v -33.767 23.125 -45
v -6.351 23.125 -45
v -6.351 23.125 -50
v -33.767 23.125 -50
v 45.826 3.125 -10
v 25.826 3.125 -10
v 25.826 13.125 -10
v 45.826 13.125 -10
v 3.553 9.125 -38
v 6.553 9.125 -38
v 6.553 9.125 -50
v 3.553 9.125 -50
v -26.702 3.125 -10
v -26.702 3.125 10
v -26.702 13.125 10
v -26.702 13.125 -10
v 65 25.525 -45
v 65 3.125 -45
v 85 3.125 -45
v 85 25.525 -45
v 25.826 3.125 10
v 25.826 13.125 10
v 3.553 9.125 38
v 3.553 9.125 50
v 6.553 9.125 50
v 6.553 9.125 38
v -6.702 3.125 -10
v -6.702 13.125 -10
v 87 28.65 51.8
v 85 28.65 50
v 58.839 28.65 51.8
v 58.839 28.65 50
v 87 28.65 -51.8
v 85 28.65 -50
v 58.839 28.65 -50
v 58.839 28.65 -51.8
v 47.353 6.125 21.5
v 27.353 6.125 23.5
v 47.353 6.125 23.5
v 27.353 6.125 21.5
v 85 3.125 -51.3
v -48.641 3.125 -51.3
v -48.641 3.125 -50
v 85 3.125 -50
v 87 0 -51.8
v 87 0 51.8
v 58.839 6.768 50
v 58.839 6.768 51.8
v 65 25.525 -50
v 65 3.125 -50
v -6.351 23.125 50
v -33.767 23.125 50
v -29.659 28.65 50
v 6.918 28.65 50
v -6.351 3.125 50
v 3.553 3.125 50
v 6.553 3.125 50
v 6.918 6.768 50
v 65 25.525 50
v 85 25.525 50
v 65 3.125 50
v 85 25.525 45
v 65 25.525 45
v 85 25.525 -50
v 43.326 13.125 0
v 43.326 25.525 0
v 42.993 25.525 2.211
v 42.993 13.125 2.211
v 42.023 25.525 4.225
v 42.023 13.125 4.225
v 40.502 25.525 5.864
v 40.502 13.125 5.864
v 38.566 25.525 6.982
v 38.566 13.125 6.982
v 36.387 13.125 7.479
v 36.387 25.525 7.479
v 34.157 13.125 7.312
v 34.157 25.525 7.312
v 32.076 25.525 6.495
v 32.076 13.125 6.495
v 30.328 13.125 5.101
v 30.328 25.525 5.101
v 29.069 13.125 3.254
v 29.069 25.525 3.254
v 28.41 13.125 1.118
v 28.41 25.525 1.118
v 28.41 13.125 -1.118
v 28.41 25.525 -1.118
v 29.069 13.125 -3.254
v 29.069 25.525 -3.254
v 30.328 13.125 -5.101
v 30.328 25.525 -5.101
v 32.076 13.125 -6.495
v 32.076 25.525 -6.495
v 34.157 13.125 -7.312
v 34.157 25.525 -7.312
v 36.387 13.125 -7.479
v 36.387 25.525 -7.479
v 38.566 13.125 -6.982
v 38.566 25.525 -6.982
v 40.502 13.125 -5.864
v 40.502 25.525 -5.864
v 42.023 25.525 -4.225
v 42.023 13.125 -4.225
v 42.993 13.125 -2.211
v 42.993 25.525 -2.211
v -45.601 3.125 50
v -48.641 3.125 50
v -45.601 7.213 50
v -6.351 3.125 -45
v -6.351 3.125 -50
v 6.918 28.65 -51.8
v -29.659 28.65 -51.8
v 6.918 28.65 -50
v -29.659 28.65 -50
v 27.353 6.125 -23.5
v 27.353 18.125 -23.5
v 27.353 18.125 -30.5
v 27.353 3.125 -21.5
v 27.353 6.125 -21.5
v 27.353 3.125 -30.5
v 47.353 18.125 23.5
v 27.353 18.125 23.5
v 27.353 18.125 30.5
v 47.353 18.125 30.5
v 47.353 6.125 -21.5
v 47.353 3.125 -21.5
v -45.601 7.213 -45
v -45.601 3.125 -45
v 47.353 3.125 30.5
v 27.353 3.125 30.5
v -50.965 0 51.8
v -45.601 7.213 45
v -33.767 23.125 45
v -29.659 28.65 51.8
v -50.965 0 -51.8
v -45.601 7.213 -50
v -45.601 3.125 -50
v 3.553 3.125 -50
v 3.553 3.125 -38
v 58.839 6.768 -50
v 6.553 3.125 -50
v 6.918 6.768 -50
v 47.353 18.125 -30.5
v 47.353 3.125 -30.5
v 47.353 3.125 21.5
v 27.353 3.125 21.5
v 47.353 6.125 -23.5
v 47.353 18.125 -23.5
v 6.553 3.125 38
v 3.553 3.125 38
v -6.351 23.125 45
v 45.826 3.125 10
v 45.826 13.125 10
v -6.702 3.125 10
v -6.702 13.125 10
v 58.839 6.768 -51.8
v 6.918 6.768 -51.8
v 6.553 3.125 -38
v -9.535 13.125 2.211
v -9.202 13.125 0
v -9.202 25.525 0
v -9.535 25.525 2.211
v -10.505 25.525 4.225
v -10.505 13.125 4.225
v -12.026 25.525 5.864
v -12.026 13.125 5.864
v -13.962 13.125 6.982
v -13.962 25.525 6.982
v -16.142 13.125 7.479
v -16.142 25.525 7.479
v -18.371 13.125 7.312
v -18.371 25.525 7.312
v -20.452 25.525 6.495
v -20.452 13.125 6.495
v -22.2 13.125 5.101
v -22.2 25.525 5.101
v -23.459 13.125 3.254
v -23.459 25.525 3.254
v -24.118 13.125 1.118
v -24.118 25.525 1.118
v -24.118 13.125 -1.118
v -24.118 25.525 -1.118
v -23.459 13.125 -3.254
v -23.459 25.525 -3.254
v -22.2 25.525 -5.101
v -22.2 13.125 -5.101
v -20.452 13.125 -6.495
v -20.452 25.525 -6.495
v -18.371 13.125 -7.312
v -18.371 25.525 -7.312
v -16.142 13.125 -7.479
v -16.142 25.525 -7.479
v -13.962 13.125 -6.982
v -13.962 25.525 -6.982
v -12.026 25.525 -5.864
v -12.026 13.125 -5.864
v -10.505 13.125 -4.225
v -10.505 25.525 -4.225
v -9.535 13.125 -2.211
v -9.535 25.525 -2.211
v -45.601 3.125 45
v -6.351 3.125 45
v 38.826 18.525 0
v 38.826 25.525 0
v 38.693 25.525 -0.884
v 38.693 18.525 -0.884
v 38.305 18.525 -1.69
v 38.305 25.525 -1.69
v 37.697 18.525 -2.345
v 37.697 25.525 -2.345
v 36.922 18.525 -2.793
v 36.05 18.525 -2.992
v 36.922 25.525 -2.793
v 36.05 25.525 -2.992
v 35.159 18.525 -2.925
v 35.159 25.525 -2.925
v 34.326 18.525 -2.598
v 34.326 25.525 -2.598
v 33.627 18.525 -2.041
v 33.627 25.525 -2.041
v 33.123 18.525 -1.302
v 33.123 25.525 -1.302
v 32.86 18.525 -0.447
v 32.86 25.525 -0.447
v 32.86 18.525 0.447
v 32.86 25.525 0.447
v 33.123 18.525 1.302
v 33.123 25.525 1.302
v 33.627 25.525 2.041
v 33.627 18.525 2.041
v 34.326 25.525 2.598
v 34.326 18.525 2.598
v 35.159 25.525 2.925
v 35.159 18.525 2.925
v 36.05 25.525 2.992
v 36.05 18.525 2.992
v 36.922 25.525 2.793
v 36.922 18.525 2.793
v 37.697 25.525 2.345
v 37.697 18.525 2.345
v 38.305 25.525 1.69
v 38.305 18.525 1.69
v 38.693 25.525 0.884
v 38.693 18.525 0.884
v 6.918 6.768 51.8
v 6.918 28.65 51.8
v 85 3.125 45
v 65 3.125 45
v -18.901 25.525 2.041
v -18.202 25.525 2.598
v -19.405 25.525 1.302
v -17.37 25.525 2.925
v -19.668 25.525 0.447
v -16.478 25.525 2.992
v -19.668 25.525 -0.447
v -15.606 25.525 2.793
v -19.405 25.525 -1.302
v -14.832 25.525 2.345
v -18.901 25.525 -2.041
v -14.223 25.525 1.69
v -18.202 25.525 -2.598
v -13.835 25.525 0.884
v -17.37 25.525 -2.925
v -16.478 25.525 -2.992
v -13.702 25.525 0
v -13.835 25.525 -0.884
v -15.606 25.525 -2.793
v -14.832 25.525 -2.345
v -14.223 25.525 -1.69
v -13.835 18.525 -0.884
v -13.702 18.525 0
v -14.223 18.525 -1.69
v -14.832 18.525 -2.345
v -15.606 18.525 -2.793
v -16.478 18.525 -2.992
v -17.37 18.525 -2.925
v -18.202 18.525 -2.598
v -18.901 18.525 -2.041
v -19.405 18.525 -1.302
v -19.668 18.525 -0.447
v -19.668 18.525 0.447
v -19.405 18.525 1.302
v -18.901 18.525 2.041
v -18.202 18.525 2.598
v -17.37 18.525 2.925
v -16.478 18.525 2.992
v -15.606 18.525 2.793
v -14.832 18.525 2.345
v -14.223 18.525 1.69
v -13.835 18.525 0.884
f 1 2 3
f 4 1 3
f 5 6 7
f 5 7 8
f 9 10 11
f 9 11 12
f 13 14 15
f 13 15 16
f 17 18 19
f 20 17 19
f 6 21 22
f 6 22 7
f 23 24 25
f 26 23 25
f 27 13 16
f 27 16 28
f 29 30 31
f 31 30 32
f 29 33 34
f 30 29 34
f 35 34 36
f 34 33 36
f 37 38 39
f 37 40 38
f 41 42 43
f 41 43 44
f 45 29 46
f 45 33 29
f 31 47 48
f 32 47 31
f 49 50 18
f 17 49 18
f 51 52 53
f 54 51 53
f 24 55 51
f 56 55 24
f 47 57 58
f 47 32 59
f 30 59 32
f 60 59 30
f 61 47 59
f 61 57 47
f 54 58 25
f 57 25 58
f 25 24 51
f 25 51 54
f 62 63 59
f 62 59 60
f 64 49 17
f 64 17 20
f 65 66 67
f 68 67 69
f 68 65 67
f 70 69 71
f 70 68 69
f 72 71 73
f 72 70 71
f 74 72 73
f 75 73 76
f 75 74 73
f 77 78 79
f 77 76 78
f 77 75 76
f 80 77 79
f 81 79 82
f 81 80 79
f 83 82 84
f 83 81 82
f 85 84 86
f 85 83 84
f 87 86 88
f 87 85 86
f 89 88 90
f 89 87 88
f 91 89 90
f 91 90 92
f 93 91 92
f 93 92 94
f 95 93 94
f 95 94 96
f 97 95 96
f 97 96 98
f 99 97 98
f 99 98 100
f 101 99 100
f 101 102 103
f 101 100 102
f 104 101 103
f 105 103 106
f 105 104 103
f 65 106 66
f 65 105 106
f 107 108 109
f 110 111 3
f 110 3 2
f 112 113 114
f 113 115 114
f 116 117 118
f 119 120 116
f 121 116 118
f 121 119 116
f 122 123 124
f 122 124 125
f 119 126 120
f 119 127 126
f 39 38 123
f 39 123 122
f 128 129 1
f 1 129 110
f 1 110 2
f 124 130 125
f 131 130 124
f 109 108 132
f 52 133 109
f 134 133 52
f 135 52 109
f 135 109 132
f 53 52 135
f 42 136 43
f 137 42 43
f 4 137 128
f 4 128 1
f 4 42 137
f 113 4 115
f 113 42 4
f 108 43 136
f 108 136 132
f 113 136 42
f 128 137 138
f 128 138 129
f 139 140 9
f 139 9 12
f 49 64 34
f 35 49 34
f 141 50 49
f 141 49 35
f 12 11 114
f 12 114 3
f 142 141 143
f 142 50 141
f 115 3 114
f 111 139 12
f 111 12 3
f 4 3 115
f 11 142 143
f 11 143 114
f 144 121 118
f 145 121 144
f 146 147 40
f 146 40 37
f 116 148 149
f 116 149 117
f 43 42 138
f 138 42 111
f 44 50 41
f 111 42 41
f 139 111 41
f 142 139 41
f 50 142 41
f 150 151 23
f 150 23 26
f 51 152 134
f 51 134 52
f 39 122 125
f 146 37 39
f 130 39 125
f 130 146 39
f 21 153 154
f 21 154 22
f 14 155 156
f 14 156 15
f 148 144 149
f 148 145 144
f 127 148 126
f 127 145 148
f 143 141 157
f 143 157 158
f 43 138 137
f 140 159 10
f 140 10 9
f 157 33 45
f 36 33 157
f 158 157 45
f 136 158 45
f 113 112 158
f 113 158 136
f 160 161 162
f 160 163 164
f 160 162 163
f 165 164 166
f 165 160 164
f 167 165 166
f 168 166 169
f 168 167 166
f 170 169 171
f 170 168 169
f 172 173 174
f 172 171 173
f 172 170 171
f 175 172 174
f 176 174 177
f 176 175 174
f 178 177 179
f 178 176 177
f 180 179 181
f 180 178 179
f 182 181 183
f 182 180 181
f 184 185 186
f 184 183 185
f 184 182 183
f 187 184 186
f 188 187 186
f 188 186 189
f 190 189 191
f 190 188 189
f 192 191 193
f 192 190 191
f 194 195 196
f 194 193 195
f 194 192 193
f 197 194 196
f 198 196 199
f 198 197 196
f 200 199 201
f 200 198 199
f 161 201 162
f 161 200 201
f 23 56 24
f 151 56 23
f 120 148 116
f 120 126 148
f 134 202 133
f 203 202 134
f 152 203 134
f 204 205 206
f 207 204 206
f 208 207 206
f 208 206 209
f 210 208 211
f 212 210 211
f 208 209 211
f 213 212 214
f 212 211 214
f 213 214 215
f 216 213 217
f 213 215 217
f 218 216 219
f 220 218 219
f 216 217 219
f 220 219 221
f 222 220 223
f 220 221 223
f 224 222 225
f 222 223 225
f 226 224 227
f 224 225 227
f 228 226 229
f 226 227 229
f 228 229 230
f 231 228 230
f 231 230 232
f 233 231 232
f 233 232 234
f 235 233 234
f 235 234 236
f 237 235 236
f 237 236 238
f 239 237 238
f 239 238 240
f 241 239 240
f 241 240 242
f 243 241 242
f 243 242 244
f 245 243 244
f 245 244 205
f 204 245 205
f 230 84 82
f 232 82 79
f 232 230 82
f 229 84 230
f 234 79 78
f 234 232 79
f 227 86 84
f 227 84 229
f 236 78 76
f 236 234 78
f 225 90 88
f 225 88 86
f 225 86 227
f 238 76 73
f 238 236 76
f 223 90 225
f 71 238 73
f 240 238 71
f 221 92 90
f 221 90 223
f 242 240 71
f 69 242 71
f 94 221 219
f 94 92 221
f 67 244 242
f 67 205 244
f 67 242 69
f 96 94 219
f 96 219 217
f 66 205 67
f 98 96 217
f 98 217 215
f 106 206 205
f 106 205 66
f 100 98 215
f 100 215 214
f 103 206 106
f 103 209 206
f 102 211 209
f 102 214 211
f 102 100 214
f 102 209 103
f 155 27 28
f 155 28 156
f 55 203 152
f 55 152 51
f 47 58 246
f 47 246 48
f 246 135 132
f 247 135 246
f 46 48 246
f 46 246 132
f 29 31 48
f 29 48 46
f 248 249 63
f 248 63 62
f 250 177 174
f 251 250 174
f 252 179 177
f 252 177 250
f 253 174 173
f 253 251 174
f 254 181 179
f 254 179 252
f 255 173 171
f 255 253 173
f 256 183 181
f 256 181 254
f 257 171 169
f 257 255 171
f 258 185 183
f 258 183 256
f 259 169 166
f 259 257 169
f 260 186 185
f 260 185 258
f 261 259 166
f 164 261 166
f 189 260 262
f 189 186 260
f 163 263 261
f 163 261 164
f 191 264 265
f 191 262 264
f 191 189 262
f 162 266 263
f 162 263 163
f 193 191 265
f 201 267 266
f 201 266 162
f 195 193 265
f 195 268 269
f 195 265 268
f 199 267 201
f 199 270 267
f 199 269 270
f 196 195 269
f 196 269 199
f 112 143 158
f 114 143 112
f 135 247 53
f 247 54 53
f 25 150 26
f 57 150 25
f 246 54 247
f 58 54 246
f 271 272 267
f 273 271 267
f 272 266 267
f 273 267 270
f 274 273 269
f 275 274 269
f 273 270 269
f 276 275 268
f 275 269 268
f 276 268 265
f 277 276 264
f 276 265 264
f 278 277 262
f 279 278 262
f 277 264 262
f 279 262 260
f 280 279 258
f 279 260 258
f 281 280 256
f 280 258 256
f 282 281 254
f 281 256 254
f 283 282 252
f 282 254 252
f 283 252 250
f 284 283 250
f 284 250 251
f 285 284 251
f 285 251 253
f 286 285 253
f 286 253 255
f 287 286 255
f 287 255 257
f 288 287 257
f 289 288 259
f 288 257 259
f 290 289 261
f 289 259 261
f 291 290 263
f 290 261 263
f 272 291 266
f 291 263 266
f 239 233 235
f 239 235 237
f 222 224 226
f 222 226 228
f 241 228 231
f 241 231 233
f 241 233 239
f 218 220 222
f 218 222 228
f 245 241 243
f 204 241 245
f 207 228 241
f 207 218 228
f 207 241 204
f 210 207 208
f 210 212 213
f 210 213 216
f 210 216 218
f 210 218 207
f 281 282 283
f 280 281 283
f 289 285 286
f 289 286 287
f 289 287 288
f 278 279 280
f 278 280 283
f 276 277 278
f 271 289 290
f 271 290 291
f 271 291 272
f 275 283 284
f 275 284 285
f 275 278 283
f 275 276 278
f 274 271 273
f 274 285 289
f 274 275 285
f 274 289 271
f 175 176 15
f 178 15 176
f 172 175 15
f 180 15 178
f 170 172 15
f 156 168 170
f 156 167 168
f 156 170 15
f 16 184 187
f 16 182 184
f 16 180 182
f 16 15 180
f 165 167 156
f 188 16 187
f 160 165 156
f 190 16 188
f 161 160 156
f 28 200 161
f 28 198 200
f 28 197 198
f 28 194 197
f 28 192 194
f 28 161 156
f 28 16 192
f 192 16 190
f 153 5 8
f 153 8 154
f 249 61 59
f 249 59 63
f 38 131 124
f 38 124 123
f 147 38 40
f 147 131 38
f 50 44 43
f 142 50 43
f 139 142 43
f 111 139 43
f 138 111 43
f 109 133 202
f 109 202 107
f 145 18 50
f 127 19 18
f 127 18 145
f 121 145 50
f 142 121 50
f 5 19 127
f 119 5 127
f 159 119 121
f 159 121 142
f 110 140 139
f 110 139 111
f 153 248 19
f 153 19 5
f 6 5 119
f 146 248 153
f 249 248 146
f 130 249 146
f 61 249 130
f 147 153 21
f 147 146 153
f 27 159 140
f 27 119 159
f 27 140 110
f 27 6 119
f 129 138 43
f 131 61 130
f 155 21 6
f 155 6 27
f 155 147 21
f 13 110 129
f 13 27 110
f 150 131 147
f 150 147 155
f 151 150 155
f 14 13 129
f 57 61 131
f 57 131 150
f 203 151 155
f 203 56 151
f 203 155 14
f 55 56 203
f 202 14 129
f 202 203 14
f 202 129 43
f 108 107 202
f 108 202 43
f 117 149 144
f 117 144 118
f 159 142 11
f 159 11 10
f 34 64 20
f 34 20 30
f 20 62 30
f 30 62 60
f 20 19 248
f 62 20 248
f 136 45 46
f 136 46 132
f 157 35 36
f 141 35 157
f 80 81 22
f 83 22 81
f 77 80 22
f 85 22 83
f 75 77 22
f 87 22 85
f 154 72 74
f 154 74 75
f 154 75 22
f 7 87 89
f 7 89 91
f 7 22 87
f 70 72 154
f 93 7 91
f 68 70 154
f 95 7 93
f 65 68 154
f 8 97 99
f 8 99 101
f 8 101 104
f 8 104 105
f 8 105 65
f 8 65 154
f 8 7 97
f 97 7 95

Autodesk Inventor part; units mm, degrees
ref_plane "YZ Plane" through (0, 0, 0) normal (1, 0, 0) x (0, 1, 0)
ref_plane "XZ Plane" through (0, 0, 0) normal (0, 1, 0) x (-1, 0, 0)
ref_plane "XY Plane" through (0, 0, 0) normal (0, 0, 1) x (1, 0, 0)
sketch "Sketch1" plane through (0, 0, 0) normal (0, 1, 0) x (-1, 0, 0)
  line L0 (85, 50) -> (-85, 50)
  line L1 (-85, 50) -> (-85, -50)
  line L2 (-85, -50) -> (85, -50)
  line L3 (85, -50) -> (85, 50)
  line L4 (85, 50) -> (-85, -50) construction
  line L5 (-85, 50) -> (85, -50) construction
  point P0 (0, 0)
  dimension "d0" = 170
  dimension "d1" = 100
extrude "Extrusion1" add sketch "Sketch1" along normal blind 3.125
sketch "Sketch2" plane through (0, 3.125, 0) normal (0, 1, 0) x (1, 0, 0)
  line L0 (-26.702, 10) -> (-6.702, 10)
  line L1 (-6.702, 10) -> (-6.702, -10)
  line L2 (-6.702, -10) -> (-26.702, -10)
  line L3 (-26.702, -10) -> (-26.702, 10)
  line L4 (-26.702, 10) -> (-6.702, -10) construction
  line L5 (-6.702, 10) -> (-26.702, -10) construction
  circle A0 centre (-16.702, 0) radius 7.5
  line L6 (25.8262, 10) -> (45.8262, 10)
  line L7 (45.8262, 10) -> (45.8262, -10)
  line L8 (45.8262, -10) -> (25.8262, -10)
  line L9 (25.8262, -10) -> (25.8262, 10)
  line L10 (25.8262, 10) -> (45.8262, -10) construction
  line L11 (45.8262, 10) -> (25.8262, -10) construction
  circle A1 centre (35.8262, 0) radius 7.5
  line L12 (0.1504, 0) -> (2.6516, 0) construction
  point P0 (0, 0)
  dimension "d13" = 0
  dimension "d4" = 20
  dimension "d5" = 20
  dimension "d6" = 15
  dimension "d14" = 20
  dimension "d15" = 20
  dimension "d16" = 15
extrude "Extrusion2" add sketch "Sketch2" along normal blind 22.4 contours A0 | A1
extrude "Extrusion3" add sketch "Sketch2" along normal blind 10 contours L0 L1 L2 L3 | L6 L7 L8 L9 | A1
sketch "Sketch3" plane through (-16.702, 25.525, 0) normal (0, 1, 0) x (1, 0, 0)
  circle A0 centre (0, 0) radius 3
  point P0 (16.702, 0)
  dimension "d11" = 6
extrude "Extrusion4" cut sketch "Sketch3" against normal blind 7
sketch "Sketch4" plane through (35.8262, 25.525, 0) normal (0, 1, 0) x (1, 0, 0)
  circle A0 centre (0, 0) radius 3
  point P0 (-35.8262, 0)
  dimension "d17" = 6
extrude "Extrusion5" cut sketch "Sketch4" against normal blind 7
sketch "Sketch5" plane through (0, 3.125, 0) normal (0, 1, 0) x (1, 0, 0)
  line L0 (85, 50) -> (-85, 50) projected
  line L1 (-85, 50) -> (85, 50)
  line L2 (85, 50) -> (85, 51.3)
  line L3 (85, 51.3) -> (-85, 51.3)
  line L4 (-85, 51.3) -> (-85, 50)
  line L5 (-85, -50) -> (85, -50) projected
  line L6 (-85, -50) -> (85, -50)
  line L7 (85, -50) -> (85, -51.3)
  line L8 (85, -51.3) -> (-85, -51.3)
  line L9 (-85, -51.3) -> (-85, -50)
  line L10 (85, -51.3) -> (87, -51.3)
  line L11 (87, -51.3) -> (87, 51.3)
  line L12 (87, 51.3) -> (85, 51.3)
  line L13 (85, 51.3) -> (85, -51.3)
  point P0 (0, 0)
  point P1 (85, -50)
  dimension "d20" = 1.3
  dimension "d21" = 1.3
  dimension "d22" = 2
extrude "Extrusion6" add sketch "Sketch5" along normal blind 25.525
sketch "Sketch6" plane through (-85, 0, 50) normal (0, 0, 1) x (1, 0, 0)
  line L0 (170, 0) -> (0, 0) projected
  line L1 (170, 0) -> (170, 3.125) projected
  line L2 (0, 0) -> (170, 0)
  line L3 (170, 0) -> (170, 3.125)
  line L4 (170, 3.125) -> (0, 3.125)
  line L5 (0, 3.125) -> (0, 0)
  point P0 (85, 0)
extrude "Extrusion7" add sketch "Sketch6" along normal blind 1.3
sketch "Sketch7" plane through (85, 0, -50) normal (0, 0, -1) x (-1, 0, 0)
  line L0 (0, 0) -> (0, 3.125) projected
  line L1 (170, 0) -> (170, 28.65) projected
  line L2 (0, 0) -> (170, 0)
  line L3 (170, 0) -> (170, 2.2028)
  line L4 (170, 2.2028) -> (0, 2.2028)
  line L5 (0, 2.2028) -> (0, 0)
extrude "Extrusion8" add sketch "Sketch7" along normal blind 1.3
sketch "Sketch8" plane through (85, 0, 51.3) normal (1, 0, 0) x (0, 0, -1)
  line L0 (0, 0) -> (0, 3.125) projected
  line L1 (0, 0) -> (102.6, 0) projected
  line L2 (0, 3.125) -> (102.6, 3.125)
  line L3 (102.6, 3.125) -> (102.6, 0)
  line L4 (102.6, 0) -> (0, 0)
  line L5 (0, 0) -> (0, 3.125)
  point P0 (51.3, 0)
extrude "Extrusion9" add sketch "Sketch8" along normal blind 2
sketch "Sketch9" plane through (0, 3.125, 0) normal (0, 1, 0) x (1, 0, 0)
  line L0 (85, -50) -> (85, 50) projected
  line L1 (85, 50) -> (65, 50)
  line L2 (65, 50) -> (65, 45)
  line L3 (65, 45) -> (85, 45)
  line L4 (85, 45) -> (85, 50)
  line L5 (85, -50) -> (65, -50)
  line L6 (65, -50) -> (65, -45)
  line L7 (65, -45) -> (85, -45)
  line L8 (85, -45) -> (85, -50)
  point P0 (0, 0)
  dimension "d31" = 20
  dimension "d32" = 5
  dimension "d33" = 20
  dimension "d34" = 5
extrude "Extrusion10" add sketch "Sketch9" along normal blind 22.4
sketch "Sketch10" plane through (-85, 3.125, 50) normal (0, 0, -1) x (-1, 0, 0)
  line L0 (-170, 25.525) -> (0, 25.525) projected
  line L1 (-143.8389, 3.6428) -> (-91.9175, 3.6428)
  line L2 (-91.9175, 3.6428) -> (-91.9175, 25.525)
  line L3 (-91.9175, 25.525) -> (-143.8389, 25.525)
  line L4 (-143.8389, 25.525) -> (-143.8389, 3.6428)
  point P0 (-150, 27.4)
  point P1 (-143.8389, 25.525)
extrude "Extrusion11" cut sketch "Sketch10" against normal blind 27.4
mirror "Mirror1" about plane through (0, 0, 0) normal (0, 0, 1) of "Extrusion11"
sketch "Sketch11" plane through (0, 3.125, 0) normal (0, 1, 0) x (1, 0, 0)
  line L0 (47.3531, -30.5) -> (27.3531, -30.5)
  line L1 (27.3531, -30.5) -> (27.3531, -23.5)
  line L2 (27.3531, -23.5) -> (47.3531, -23.5)
  line L3 (47.3531, -23.5) -> (47.3531, -30.5)
  line L4 (-85, -50) -> (65, -50) projected
  point P0 (0, 0)
  dimension "d39" = 7
  dimension "d42" = 19.5
  dimension "d43" = 20
extrude "Extrusion12" add sketch "Sketch11" along normal blind 15
sketch "Sketch12" plane through (0, 3.125, 0) normal (0, 1, 0) x (1, 0, 0)
  line L0 (27.3531, -23.5) -> (47.3531, -23.5) projected
  line L1 (47.3531, -23.5) -> (27.3531, -23.5)
  line L2 (27.3531, -23.5) -> (27.3531, -21.5)
  line L3 (27.3531, -21.5) -> (47.3531, -21.5)
  line L4 (47.3531, -21.5) -> (47.3531, -23.5)
  point P0 (0, 0)
  dimension "d44" = 2
extrude "Extrusion13" add sketch "Sketch12" along normal blind 3
mirror "Mirror2" about plane through (0, 0, 0) normal (0, 0, 1) of "Extrusion12", "Extrusion13"
sketch "Sketch13" plane through (0, 3.125, 0) normal (0, 1, 0) x (1, 0, 0)
  line L0 (-85, -50) -> (65, -50) projected
  line L1 (6.5534, -50) -> (3.5534, -50)
  line L2 (3.5534, -50) -> (3.5534, -38)
  line L3 (3.5534, -38) -> (6.5534, -38)
  line L4 (6.5534, -38) -> (6.5534, -50)
  point P0 (0, 0)
  dimension "d47" = 3
  dimension "d48" = 12
extrude "Extrusion14" add sketch "Sketch13" along normal blind 6
mirror "Mirror3" about plane through (0, 0, 0) normal (0, 0, 1) of "Extrusion14"
sketch "Sketch14" plane through (0, 3.125, 0) normal (0, 1, 0) x (1, 0, 0)
  line L0 (-85, -50) -> (3.5534, -50) projected
  line L1 (-6.3506, -50) -> (-26.3506, -50)
  line L2 (-26.3506, -50) -> (-26.3506, -45)
  line L3 (-26.3506, -45) -> (-6.3506, -45)
  line L4 (-6.3506, -45) -> (-6.3506, -50)
  point P0 (0, 0)
  dimension "d51" = 20
  dimension "d52" = 5
extrude "Extrusion15" add sketch "Sketch14" along normal blind 20
mirror "Mirror4" about plane through (0, 0, 0) normal (0, 0, 1) of "Extrusion15"
sketch "Sketch15" plane through (-85, 3.125, 50) normal (0, 0, -1) x (-1, 0, 0)
  line L0 (0, 0) -> (-58.6494, 0) projected
  line L1 (-91.9175, 25.525) -> (0, 25.525) projected
  line L2 (0, 0) -> (-30.3469, 0)
  line L3 (-30.3469, 0) -> (-30.3469, 25.525)
  line L4 (-30.3469, 25.525) -> (0, 25.525)
  line L5 (0, 25.525) -> (0, 0)
  point P0 (-85, -3.125)
  point P1 (0, 25.525)
  point P2 (-30.3469, 0)
extrude "Extrusion16" cut sketch "Sketch15" against normal blind 20
mirror "Mirror5" about plane through (0, 0, 0) normal (0, 0, 1) of "Extrusion16"
sketch "Sketch17" plane through (-85, 2.2028, -50) normal (0, 1, 0) x (1, 0, 0)
  line L0 (170, 0) -> (0, 0) projected
  line L1 (0, 0) -> (170, 0)
  line L2 (170, 0) -> (170, 1.3)
  line L3 (170, 1.3) -> (0, 1.3)
  line L4 (0, 1.3) -> (0, 0)
  point P0 (85, -50)
extrude "Extrusion19" add sketch "Sketch17" along normal blind 0.922
sketch "Sketch18" plane through (0, 28.65, 0) normal (0, 1, 0) x (1, 0, 0)
  line L0 (85, 51.3) -> (-85, 51.3) projected
  line L1 (-85, -51.3) -> (87, -51.3) projected
  line L2 (-85, 51.3) -> (-50.9649, 51.3)
  line L3 (-50.9649, 51.3) -> (-50.9649, -51.3)
  line L4 (-50.9649, -51.3) -> (-85, -51.3)
  line L5 (-85, -51.3) -> (-85, 51.3)
  point P0 (0, 0)
extrude "Extrusion20" cut sketch "Sketch18" against normal blind 125.922
sketch "Sketch24" plane through (-26.3506, 3.125, 45) normal (-1, 0, 0) x (0, 0, 1)
  line L0 (0, 20) -> (5, 20) projected
  line L1 (5, 0) -> (0, 0)
  line L2 (0, 0) -> (0, 20)
  line L3 (0, 20) -> (5, 20)
  line L4 (5, 20) -> (5, 0)
  point P0 (-45, -3.125)
extrude "Extrusion26" add sketch "Sketch24" along normal blind 19.25
sketch "Sketch25" plane through (-26.3506, 3.125, -45) normal (-1, 0, 0) x (0, 0, 1)
  line L0 (-5, 0) -> (-5, 20) projected
  line L1 (-5, 0) -> (0, 0)
  line L2 (0, 0) -> (0, 20)
  line L3 (0, 20) -> (-5, 20)
  line L4 (-5, 20) -> (-5, 0)
  point P0 (45, -3.125)
extrude "Extrusion27" add sketch "Sketch25" along normal blind 19.25
sketch "Sketch26" plane through (87, 0, 51.3) normal (0, 0, 1) x (1, 0, 0)
  line L0 (-137.9649, 0) -> (0, 0) projected
  line L1 (-137.9649, 0) -> (-116.6587, 0)
  line L2 (-116.6587, 0) -> (-116.6587, 28.65)
  line L3 (-137.9649, 28.65) -> (-80.0825, 28.65) projected
  line L4 (-116.6587, 28.65) -> (-137.9649, 0)
  line L5 (-137.9649, 28.65) -> (-137.9649, 3.125) projected
  line L6 (-116.6587, 28.65) -> (-137.9649, 28.65)
  line L7 (-137.9649, 28.65) -> (-137.9649, 0)
  point P0 (-87, 0)
  point P1 (-137.9649, 3.125)
extrude "Extrusion28" cut sketch "Sketch26" against normal blind 133 contours L7 L5 L3 L4
sketch "Sketch29" plane through (87, 0, -51.3) normal (0, 0, -1) x (-1, 0, 0)
  line L0 (0, 0) -> (0, 28.65) projected
  line L1 (28.1611, 28.65) -> (0, 28.65) projected
  line L2 (0, 0) -> (0, 28.65)
  line L3 (28.1611, 28.65) -> (28.1611, 6.7678) projected
  line L4 (0, 28.65) -> (28.1611, 28.65)
  line L5 (28.1611, 28.65) -> (28.1611, 6.7678)
  line L6 (80.4466, 3.125) -> (80.4466, 9.125) projected
  line L7 (28.1611, 6.7678) -> (80.0825, 6.7678) projected
  line L8 (80.0825, 6.7678) -> (28.1611, 6.7678)
  line L9 (116.6587, 28.65) -> (80.0825, 28.65) projected
  line L10 (80.0825, 6.7678) -> (80.0825, 28.65)
  line L11 (80.0825, 28.65) -> (116.6587, 28.65)
  line L12 (116.6587, 28.65) -> (137.9649, 0) projected
  line L13 (116.6587, 28.65) -> (137.9649, 0)
  line L14 (137.9649, 0) -> (0, 0)
  point P0 (87, 0)
extrude "Extrusion31" add sketch "Sketch29" along normal blind 0.5
mirror "Mirror6" about plane through (0, 0, 0) normal (0, 0, 1) of "Extrusion31"
properties part number "Sujeta_motor_3DPrint"
